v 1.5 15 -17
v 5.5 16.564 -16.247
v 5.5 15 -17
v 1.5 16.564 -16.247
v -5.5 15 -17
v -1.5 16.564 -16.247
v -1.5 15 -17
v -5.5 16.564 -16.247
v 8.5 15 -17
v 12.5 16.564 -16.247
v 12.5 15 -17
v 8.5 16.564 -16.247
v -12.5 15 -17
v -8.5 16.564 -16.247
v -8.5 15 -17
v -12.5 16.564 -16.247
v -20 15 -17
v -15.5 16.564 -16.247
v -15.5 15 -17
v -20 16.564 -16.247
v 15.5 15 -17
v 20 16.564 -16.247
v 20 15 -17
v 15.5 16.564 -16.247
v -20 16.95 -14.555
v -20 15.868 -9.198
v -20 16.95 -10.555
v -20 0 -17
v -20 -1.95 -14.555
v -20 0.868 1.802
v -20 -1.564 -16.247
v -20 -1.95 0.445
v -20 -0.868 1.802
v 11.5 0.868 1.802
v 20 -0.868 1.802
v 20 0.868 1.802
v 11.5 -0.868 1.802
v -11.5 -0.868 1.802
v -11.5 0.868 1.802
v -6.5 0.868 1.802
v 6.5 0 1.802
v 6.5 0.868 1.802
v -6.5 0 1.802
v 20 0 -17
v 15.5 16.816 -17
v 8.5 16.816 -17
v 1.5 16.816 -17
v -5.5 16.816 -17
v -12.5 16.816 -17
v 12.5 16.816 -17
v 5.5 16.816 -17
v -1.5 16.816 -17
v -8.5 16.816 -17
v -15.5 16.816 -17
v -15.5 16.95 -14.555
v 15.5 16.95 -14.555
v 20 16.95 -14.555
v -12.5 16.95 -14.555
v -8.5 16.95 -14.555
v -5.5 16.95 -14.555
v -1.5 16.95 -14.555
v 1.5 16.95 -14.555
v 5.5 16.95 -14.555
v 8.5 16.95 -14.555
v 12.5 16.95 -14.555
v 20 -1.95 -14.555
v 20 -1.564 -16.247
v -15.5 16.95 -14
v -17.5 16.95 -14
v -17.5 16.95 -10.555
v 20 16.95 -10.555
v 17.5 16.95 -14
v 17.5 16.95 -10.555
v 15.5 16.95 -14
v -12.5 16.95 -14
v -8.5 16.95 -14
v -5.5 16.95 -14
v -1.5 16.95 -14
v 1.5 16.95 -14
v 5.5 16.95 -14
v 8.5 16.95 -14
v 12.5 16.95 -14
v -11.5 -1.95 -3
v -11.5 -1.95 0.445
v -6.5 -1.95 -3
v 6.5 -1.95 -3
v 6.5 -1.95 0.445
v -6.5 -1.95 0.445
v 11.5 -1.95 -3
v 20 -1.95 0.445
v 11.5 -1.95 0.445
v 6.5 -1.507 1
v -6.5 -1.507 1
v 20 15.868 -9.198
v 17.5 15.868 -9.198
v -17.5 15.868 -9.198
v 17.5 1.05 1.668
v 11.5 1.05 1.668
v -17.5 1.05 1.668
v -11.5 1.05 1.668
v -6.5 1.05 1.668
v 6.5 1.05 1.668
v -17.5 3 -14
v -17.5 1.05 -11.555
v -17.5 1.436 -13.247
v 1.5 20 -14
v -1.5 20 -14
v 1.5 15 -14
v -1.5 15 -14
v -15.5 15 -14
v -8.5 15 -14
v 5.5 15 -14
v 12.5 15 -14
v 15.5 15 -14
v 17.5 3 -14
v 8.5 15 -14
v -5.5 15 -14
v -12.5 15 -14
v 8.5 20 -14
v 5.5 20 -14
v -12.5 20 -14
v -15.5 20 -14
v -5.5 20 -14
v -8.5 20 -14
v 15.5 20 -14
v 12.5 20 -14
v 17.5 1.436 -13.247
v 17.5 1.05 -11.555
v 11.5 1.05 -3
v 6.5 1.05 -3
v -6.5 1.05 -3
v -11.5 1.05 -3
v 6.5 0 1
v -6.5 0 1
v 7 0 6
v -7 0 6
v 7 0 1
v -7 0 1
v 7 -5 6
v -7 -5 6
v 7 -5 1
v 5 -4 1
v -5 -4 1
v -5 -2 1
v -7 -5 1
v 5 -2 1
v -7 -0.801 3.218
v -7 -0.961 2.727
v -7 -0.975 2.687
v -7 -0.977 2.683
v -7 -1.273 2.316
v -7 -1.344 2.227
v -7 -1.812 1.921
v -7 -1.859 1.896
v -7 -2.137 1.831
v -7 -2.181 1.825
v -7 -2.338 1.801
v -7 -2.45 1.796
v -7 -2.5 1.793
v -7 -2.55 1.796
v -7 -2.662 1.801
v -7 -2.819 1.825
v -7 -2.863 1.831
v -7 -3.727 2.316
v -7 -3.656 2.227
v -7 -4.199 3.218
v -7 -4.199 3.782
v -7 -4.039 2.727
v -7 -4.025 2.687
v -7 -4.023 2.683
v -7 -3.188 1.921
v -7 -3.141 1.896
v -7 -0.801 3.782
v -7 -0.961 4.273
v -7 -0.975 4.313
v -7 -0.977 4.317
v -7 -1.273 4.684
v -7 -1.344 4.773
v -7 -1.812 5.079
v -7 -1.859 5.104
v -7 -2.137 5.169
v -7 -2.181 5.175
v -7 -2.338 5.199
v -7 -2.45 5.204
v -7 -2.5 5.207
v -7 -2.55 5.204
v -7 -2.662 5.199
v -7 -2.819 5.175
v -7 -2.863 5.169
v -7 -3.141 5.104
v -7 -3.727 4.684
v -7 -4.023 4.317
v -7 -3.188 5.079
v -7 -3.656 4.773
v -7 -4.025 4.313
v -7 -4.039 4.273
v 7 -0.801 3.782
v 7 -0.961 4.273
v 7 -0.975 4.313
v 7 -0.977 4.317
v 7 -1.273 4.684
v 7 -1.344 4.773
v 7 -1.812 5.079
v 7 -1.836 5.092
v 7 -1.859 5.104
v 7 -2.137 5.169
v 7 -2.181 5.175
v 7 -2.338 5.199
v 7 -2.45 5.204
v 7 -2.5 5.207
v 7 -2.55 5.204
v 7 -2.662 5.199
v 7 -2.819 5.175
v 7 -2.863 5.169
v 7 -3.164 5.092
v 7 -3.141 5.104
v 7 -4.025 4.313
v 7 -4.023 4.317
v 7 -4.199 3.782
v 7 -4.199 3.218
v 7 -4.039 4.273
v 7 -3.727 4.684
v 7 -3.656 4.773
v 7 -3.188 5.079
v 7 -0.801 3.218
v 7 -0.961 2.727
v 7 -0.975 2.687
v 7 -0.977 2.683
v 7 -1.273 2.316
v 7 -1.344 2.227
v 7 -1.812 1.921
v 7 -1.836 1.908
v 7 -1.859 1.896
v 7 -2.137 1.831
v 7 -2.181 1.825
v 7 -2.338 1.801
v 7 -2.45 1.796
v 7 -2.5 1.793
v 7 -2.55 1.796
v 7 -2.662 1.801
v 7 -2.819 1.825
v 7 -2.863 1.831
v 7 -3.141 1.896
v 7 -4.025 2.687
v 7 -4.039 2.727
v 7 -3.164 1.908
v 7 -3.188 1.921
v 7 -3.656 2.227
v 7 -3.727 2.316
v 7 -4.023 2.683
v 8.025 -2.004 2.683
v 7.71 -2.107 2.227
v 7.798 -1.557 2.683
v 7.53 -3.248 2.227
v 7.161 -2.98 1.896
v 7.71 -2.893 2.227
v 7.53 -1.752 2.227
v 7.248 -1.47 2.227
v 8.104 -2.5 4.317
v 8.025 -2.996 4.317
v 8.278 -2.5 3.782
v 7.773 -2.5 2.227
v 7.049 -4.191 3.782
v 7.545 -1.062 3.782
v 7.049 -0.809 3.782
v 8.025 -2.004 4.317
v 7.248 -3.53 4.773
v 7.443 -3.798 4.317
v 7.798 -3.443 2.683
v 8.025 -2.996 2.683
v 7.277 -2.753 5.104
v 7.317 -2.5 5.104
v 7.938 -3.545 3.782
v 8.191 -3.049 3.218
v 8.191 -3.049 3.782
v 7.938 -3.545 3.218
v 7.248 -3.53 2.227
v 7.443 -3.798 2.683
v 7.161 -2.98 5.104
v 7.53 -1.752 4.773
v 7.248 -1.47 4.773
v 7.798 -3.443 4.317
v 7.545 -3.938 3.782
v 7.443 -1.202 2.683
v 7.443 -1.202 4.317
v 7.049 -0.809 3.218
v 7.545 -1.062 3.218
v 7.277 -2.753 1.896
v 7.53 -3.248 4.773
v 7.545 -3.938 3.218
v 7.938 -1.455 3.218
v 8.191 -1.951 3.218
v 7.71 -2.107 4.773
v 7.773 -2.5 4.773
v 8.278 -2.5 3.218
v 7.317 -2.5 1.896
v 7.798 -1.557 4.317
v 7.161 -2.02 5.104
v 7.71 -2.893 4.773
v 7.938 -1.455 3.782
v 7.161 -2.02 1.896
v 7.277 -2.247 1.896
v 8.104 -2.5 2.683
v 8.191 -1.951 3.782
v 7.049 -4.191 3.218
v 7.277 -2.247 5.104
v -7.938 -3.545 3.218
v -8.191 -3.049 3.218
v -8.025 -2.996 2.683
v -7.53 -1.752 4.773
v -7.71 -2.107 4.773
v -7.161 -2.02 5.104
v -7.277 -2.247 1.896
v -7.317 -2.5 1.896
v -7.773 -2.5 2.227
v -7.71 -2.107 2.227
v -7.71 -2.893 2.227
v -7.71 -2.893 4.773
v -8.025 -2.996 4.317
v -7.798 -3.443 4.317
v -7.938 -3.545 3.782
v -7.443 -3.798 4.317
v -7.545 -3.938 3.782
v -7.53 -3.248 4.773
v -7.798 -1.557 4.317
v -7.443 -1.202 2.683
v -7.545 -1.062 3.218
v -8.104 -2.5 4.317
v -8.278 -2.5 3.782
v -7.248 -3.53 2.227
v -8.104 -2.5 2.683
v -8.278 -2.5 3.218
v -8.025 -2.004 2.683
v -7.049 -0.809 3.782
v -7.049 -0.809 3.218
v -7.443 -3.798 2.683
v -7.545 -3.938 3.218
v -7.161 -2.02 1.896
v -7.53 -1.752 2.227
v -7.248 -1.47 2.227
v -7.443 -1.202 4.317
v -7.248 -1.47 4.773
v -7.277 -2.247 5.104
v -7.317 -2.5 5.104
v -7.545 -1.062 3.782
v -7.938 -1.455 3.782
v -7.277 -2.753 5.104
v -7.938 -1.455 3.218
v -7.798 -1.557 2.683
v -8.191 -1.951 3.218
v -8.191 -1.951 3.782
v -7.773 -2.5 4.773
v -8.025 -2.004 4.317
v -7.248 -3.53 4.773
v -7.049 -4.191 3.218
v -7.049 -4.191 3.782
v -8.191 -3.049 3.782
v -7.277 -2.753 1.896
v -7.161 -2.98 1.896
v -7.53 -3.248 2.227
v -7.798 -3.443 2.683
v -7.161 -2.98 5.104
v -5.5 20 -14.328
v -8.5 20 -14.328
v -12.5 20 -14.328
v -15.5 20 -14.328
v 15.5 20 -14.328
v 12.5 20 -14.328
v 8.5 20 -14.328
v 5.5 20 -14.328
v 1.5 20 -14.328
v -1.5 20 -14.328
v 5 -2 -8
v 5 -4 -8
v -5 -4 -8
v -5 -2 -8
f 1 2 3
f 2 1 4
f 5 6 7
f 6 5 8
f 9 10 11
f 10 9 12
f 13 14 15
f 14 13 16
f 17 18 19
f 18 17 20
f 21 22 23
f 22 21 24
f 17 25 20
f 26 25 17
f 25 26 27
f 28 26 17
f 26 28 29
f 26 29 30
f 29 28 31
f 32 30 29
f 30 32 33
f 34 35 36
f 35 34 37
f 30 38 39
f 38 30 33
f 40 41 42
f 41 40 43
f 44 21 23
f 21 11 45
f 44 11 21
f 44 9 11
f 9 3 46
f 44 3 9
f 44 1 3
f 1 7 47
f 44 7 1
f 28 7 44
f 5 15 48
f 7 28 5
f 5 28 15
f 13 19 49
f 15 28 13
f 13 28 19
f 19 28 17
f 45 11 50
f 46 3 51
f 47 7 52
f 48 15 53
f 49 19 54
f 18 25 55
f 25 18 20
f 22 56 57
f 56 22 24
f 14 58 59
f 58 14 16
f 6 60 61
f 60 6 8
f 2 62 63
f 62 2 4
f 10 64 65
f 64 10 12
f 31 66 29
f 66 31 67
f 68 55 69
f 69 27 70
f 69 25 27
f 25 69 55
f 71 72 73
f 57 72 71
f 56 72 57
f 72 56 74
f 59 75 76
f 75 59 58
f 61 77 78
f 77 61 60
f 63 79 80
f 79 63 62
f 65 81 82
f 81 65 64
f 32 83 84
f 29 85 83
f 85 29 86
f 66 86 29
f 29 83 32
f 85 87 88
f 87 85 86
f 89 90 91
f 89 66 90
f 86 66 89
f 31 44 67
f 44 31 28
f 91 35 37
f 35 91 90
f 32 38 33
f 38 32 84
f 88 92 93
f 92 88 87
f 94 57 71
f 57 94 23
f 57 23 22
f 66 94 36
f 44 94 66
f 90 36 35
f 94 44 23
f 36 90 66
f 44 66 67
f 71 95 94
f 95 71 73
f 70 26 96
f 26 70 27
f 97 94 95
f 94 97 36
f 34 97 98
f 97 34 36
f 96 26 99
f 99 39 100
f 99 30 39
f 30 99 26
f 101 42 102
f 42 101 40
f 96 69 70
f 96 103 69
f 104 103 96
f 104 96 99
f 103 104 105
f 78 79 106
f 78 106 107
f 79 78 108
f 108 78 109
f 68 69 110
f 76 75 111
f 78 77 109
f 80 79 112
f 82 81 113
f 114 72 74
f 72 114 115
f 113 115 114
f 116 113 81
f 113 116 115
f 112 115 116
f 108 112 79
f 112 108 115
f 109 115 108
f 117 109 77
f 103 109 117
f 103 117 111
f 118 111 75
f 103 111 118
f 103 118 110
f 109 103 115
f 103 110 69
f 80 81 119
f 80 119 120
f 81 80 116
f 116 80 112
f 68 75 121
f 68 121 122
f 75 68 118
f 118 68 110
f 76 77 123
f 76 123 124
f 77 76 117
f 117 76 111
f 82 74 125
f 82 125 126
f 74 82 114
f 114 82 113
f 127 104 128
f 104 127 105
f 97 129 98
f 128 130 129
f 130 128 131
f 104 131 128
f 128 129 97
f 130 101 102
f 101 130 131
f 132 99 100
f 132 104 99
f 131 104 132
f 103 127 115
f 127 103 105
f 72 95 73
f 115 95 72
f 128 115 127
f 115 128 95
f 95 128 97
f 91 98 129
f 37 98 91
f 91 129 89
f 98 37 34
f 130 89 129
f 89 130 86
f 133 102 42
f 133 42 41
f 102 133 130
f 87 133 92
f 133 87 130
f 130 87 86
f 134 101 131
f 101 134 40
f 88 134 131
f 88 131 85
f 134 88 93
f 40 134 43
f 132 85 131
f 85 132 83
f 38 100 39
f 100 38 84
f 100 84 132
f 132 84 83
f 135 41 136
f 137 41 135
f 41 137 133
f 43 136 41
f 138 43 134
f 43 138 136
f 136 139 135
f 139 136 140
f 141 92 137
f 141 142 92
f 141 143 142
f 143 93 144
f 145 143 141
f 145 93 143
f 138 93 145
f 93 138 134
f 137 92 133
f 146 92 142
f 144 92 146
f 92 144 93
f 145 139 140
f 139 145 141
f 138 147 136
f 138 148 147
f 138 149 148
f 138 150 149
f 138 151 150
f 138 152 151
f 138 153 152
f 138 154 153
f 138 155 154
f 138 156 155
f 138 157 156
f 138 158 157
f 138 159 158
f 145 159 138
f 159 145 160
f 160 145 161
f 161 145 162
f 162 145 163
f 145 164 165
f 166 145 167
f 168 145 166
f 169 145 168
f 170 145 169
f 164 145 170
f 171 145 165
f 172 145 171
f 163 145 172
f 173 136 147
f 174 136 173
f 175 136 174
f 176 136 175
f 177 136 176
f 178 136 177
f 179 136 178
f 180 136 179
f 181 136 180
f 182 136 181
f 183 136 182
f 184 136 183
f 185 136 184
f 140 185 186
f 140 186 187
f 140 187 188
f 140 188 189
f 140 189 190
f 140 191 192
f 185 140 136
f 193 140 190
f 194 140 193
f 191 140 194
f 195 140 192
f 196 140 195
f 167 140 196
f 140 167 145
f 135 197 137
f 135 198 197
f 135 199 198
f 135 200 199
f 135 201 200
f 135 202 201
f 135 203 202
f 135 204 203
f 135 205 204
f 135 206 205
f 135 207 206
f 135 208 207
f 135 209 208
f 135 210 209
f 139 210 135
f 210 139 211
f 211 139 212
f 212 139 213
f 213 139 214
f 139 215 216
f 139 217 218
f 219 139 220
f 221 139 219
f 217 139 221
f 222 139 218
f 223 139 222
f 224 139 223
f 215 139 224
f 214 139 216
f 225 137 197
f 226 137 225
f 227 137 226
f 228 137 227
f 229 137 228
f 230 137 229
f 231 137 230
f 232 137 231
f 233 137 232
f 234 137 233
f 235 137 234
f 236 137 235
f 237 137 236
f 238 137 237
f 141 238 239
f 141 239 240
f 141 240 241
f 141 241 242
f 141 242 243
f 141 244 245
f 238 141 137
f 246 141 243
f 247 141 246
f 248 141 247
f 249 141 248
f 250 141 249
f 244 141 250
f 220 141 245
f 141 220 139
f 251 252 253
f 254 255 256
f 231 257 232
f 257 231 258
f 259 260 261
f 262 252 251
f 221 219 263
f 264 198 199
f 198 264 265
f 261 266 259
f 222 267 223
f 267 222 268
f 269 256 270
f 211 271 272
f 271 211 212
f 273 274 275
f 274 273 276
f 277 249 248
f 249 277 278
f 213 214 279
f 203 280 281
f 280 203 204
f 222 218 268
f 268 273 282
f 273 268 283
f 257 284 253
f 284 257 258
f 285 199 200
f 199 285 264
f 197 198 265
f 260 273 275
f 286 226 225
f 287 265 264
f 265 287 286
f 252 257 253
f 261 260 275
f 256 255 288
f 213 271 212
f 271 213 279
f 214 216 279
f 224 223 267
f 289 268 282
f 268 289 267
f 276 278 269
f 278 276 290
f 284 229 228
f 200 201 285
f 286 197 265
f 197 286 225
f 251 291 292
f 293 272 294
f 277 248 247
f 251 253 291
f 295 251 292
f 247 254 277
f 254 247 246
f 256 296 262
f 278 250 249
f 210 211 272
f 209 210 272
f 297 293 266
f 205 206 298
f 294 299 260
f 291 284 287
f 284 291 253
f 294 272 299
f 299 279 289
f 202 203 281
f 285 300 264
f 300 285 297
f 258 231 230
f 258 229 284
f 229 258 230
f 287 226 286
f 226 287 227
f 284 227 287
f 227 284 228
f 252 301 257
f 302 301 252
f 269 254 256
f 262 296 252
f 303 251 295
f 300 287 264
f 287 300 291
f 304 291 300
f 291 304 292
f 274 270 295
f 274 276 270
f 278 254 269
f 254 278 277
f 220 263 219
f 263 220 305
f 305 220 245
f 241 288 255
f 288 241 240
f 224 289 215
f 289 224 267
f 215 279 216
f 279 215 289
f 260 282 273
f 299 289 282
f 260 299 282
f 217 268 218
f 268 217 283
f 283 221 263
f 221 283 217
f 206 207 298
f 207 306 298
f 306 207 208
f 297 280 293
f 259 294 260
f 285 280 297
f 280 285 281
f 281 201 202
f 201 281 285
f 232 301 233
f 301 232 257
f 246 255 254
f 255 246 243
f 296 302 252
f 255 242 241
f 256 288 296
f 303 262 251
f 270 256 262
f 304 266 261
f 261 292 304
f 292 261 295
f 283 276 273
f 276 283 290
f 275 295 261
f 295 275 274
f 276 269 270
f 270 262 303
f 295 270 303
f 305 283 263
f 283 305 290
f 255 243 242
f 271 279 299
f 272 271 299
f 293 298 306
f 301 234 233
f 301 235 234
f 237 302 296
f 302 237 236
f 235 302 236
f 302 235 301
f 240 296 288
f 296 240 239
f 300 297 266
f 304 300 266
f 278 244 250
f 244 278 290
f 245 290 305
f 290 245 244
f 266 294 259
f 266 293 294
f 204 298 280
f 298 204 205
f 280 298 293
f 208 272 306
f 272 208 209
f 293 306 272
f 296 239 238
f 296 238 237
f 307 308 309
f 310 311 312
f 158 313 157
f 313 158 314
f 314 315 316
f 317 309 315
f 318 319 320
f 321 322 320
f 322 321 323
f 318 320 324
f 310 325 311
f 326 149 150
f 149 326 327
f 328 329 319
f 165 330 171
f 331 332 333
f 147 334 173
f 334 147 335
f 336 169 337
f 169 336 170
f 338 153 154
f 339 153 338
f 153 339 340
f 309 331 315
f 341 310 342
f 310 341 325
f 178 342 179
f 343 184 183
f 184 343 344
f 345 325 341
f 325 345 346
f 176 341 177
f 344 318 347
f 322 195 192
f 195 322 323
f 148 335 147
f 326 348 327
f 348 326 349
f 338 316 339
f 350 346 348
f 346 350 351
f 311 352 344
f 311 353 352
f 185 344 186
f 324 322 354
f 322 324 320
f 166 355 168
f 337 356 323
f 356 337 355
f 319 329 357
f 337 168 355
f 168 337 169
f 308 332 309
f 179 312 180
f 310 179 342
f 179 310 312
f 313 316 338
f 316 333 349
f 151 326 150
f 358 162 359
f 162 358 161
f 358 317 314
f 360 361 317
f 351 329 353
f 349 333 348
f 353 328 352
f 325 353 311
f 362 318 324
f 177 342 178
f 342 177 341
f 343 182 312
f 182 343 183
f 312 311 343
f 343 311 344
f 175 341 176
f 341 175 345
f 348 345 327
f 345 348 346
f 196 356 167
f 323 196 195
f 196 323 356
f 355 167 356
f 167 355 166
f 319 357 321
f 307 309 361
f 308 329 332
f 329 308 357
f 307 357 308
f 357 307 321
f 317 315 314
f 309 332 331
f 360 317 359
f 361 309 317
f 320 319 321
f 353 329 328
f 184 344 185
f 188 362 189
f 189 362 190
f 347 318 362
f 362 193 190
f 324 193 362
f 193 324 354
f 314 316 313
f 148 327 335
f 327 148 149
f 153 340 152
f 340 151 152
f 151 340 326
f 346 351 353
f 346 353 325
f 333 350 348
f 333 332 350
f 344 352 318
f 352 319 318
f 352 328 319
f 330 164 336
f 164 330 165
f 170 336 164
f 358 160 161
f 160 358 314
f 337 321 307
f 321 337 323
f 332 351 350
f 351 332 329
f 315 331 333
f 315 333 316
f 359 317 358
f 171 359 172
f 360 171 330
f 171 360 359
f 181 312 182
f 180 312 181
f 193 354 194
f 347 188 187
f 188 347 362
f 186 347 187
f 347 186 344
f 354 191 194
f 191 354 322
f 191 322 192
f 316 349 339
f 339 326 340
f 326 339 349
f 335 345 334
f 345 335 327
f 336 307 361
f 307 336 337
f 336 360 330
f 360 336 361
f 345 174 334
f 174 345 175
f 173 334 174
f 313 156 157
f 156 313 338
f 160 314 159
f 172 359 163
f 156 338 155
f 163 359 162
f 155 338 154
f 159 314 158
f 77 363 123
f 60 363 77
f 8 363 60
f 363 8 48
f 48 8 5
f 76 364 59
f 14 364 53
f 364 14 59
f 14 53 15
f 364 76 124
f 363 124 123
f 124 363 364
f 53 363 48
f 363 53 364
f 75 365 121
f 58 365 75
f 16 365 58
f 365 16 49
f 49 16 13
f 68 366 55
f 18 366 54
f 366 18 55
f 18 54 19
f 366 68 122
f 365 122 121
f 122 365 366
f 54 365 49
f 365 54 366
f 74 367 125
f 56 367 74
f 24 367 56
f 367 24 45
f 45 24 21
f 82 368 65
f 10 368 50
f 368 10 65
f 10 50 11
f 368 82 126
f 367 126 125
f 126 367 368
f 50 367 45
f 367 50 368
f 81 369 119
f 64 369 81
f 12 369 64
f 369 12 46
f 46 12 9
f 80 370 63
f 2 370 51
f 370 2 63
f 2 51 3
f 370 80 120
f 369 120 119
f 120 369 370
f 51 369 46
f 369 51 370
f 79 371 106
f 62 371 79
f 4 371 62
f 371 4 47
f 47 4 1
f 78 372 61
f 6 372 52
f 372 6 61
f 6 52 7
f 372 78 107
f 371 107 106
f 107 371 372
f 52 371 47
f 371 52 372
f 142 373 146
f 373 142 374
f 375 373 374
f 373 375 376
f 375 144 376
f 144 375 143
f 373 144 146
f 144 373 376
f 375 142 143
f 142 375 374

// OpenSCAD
module realBucket(){

module bucket(){



linear_extrude(height = 40, center = true, convexity = 10, twist = 0)
translate([0, 0, 0])

hull() {
   translate([0,0,0]) circle(2);
   translate([15,0,0])
   circle(2);
   translate([15,15,0])
   circle(2);
   translate([11,15,0])
   circle(2);
   
 }
}


module bucket2(){

linear_extrude(height = 35, center = true, convexity = 10, twist = 0)
translate([0, 0, 0])

hull() {
   translate([0,0,0]) circle(2);
   translate([15,0,0])
   circle(2);
   translate([15,15,0])
   circle(2);
   translate([11,15,0])
   circle(2);
   
 }
}

difference(){

bucket();
translate([-3,3,0])
bucket2();

}

}

module peg(){
translate([10,0,0])
cube([5,14,5]);


translate([12.5,0.5,2.5])
sphere(1.8,$fn=20);
translate([12.5,13.5,2.5])
sphere(1.8,$fn=20);


}

difference(){

rotate([0,90,0])
realBucket();
translate([6.5,-5,-3])
cube([5,10,10]);
translate([-11.5,-5,-3])
cube([5,10,10]);
}


translate([-5,-4,-8])
cube([10,2,10]);

rotate([0,0,90])
translate([-15,-7,1])
peg();





module nail(){

difference(){
translate([0,0,0])
cube([3,5,3]);
translate([0,4,-6])
rotate([40,0,0])
cube([8,8,6]);

}
}

for(i = [[-8.5,15,-17],
		[-15.5,15,-17],
		[12.5,15,-17],
		[5.5,15,-17],
		[-1.5,15,-17],
		 ])
{


translate(i)
nail();
}
